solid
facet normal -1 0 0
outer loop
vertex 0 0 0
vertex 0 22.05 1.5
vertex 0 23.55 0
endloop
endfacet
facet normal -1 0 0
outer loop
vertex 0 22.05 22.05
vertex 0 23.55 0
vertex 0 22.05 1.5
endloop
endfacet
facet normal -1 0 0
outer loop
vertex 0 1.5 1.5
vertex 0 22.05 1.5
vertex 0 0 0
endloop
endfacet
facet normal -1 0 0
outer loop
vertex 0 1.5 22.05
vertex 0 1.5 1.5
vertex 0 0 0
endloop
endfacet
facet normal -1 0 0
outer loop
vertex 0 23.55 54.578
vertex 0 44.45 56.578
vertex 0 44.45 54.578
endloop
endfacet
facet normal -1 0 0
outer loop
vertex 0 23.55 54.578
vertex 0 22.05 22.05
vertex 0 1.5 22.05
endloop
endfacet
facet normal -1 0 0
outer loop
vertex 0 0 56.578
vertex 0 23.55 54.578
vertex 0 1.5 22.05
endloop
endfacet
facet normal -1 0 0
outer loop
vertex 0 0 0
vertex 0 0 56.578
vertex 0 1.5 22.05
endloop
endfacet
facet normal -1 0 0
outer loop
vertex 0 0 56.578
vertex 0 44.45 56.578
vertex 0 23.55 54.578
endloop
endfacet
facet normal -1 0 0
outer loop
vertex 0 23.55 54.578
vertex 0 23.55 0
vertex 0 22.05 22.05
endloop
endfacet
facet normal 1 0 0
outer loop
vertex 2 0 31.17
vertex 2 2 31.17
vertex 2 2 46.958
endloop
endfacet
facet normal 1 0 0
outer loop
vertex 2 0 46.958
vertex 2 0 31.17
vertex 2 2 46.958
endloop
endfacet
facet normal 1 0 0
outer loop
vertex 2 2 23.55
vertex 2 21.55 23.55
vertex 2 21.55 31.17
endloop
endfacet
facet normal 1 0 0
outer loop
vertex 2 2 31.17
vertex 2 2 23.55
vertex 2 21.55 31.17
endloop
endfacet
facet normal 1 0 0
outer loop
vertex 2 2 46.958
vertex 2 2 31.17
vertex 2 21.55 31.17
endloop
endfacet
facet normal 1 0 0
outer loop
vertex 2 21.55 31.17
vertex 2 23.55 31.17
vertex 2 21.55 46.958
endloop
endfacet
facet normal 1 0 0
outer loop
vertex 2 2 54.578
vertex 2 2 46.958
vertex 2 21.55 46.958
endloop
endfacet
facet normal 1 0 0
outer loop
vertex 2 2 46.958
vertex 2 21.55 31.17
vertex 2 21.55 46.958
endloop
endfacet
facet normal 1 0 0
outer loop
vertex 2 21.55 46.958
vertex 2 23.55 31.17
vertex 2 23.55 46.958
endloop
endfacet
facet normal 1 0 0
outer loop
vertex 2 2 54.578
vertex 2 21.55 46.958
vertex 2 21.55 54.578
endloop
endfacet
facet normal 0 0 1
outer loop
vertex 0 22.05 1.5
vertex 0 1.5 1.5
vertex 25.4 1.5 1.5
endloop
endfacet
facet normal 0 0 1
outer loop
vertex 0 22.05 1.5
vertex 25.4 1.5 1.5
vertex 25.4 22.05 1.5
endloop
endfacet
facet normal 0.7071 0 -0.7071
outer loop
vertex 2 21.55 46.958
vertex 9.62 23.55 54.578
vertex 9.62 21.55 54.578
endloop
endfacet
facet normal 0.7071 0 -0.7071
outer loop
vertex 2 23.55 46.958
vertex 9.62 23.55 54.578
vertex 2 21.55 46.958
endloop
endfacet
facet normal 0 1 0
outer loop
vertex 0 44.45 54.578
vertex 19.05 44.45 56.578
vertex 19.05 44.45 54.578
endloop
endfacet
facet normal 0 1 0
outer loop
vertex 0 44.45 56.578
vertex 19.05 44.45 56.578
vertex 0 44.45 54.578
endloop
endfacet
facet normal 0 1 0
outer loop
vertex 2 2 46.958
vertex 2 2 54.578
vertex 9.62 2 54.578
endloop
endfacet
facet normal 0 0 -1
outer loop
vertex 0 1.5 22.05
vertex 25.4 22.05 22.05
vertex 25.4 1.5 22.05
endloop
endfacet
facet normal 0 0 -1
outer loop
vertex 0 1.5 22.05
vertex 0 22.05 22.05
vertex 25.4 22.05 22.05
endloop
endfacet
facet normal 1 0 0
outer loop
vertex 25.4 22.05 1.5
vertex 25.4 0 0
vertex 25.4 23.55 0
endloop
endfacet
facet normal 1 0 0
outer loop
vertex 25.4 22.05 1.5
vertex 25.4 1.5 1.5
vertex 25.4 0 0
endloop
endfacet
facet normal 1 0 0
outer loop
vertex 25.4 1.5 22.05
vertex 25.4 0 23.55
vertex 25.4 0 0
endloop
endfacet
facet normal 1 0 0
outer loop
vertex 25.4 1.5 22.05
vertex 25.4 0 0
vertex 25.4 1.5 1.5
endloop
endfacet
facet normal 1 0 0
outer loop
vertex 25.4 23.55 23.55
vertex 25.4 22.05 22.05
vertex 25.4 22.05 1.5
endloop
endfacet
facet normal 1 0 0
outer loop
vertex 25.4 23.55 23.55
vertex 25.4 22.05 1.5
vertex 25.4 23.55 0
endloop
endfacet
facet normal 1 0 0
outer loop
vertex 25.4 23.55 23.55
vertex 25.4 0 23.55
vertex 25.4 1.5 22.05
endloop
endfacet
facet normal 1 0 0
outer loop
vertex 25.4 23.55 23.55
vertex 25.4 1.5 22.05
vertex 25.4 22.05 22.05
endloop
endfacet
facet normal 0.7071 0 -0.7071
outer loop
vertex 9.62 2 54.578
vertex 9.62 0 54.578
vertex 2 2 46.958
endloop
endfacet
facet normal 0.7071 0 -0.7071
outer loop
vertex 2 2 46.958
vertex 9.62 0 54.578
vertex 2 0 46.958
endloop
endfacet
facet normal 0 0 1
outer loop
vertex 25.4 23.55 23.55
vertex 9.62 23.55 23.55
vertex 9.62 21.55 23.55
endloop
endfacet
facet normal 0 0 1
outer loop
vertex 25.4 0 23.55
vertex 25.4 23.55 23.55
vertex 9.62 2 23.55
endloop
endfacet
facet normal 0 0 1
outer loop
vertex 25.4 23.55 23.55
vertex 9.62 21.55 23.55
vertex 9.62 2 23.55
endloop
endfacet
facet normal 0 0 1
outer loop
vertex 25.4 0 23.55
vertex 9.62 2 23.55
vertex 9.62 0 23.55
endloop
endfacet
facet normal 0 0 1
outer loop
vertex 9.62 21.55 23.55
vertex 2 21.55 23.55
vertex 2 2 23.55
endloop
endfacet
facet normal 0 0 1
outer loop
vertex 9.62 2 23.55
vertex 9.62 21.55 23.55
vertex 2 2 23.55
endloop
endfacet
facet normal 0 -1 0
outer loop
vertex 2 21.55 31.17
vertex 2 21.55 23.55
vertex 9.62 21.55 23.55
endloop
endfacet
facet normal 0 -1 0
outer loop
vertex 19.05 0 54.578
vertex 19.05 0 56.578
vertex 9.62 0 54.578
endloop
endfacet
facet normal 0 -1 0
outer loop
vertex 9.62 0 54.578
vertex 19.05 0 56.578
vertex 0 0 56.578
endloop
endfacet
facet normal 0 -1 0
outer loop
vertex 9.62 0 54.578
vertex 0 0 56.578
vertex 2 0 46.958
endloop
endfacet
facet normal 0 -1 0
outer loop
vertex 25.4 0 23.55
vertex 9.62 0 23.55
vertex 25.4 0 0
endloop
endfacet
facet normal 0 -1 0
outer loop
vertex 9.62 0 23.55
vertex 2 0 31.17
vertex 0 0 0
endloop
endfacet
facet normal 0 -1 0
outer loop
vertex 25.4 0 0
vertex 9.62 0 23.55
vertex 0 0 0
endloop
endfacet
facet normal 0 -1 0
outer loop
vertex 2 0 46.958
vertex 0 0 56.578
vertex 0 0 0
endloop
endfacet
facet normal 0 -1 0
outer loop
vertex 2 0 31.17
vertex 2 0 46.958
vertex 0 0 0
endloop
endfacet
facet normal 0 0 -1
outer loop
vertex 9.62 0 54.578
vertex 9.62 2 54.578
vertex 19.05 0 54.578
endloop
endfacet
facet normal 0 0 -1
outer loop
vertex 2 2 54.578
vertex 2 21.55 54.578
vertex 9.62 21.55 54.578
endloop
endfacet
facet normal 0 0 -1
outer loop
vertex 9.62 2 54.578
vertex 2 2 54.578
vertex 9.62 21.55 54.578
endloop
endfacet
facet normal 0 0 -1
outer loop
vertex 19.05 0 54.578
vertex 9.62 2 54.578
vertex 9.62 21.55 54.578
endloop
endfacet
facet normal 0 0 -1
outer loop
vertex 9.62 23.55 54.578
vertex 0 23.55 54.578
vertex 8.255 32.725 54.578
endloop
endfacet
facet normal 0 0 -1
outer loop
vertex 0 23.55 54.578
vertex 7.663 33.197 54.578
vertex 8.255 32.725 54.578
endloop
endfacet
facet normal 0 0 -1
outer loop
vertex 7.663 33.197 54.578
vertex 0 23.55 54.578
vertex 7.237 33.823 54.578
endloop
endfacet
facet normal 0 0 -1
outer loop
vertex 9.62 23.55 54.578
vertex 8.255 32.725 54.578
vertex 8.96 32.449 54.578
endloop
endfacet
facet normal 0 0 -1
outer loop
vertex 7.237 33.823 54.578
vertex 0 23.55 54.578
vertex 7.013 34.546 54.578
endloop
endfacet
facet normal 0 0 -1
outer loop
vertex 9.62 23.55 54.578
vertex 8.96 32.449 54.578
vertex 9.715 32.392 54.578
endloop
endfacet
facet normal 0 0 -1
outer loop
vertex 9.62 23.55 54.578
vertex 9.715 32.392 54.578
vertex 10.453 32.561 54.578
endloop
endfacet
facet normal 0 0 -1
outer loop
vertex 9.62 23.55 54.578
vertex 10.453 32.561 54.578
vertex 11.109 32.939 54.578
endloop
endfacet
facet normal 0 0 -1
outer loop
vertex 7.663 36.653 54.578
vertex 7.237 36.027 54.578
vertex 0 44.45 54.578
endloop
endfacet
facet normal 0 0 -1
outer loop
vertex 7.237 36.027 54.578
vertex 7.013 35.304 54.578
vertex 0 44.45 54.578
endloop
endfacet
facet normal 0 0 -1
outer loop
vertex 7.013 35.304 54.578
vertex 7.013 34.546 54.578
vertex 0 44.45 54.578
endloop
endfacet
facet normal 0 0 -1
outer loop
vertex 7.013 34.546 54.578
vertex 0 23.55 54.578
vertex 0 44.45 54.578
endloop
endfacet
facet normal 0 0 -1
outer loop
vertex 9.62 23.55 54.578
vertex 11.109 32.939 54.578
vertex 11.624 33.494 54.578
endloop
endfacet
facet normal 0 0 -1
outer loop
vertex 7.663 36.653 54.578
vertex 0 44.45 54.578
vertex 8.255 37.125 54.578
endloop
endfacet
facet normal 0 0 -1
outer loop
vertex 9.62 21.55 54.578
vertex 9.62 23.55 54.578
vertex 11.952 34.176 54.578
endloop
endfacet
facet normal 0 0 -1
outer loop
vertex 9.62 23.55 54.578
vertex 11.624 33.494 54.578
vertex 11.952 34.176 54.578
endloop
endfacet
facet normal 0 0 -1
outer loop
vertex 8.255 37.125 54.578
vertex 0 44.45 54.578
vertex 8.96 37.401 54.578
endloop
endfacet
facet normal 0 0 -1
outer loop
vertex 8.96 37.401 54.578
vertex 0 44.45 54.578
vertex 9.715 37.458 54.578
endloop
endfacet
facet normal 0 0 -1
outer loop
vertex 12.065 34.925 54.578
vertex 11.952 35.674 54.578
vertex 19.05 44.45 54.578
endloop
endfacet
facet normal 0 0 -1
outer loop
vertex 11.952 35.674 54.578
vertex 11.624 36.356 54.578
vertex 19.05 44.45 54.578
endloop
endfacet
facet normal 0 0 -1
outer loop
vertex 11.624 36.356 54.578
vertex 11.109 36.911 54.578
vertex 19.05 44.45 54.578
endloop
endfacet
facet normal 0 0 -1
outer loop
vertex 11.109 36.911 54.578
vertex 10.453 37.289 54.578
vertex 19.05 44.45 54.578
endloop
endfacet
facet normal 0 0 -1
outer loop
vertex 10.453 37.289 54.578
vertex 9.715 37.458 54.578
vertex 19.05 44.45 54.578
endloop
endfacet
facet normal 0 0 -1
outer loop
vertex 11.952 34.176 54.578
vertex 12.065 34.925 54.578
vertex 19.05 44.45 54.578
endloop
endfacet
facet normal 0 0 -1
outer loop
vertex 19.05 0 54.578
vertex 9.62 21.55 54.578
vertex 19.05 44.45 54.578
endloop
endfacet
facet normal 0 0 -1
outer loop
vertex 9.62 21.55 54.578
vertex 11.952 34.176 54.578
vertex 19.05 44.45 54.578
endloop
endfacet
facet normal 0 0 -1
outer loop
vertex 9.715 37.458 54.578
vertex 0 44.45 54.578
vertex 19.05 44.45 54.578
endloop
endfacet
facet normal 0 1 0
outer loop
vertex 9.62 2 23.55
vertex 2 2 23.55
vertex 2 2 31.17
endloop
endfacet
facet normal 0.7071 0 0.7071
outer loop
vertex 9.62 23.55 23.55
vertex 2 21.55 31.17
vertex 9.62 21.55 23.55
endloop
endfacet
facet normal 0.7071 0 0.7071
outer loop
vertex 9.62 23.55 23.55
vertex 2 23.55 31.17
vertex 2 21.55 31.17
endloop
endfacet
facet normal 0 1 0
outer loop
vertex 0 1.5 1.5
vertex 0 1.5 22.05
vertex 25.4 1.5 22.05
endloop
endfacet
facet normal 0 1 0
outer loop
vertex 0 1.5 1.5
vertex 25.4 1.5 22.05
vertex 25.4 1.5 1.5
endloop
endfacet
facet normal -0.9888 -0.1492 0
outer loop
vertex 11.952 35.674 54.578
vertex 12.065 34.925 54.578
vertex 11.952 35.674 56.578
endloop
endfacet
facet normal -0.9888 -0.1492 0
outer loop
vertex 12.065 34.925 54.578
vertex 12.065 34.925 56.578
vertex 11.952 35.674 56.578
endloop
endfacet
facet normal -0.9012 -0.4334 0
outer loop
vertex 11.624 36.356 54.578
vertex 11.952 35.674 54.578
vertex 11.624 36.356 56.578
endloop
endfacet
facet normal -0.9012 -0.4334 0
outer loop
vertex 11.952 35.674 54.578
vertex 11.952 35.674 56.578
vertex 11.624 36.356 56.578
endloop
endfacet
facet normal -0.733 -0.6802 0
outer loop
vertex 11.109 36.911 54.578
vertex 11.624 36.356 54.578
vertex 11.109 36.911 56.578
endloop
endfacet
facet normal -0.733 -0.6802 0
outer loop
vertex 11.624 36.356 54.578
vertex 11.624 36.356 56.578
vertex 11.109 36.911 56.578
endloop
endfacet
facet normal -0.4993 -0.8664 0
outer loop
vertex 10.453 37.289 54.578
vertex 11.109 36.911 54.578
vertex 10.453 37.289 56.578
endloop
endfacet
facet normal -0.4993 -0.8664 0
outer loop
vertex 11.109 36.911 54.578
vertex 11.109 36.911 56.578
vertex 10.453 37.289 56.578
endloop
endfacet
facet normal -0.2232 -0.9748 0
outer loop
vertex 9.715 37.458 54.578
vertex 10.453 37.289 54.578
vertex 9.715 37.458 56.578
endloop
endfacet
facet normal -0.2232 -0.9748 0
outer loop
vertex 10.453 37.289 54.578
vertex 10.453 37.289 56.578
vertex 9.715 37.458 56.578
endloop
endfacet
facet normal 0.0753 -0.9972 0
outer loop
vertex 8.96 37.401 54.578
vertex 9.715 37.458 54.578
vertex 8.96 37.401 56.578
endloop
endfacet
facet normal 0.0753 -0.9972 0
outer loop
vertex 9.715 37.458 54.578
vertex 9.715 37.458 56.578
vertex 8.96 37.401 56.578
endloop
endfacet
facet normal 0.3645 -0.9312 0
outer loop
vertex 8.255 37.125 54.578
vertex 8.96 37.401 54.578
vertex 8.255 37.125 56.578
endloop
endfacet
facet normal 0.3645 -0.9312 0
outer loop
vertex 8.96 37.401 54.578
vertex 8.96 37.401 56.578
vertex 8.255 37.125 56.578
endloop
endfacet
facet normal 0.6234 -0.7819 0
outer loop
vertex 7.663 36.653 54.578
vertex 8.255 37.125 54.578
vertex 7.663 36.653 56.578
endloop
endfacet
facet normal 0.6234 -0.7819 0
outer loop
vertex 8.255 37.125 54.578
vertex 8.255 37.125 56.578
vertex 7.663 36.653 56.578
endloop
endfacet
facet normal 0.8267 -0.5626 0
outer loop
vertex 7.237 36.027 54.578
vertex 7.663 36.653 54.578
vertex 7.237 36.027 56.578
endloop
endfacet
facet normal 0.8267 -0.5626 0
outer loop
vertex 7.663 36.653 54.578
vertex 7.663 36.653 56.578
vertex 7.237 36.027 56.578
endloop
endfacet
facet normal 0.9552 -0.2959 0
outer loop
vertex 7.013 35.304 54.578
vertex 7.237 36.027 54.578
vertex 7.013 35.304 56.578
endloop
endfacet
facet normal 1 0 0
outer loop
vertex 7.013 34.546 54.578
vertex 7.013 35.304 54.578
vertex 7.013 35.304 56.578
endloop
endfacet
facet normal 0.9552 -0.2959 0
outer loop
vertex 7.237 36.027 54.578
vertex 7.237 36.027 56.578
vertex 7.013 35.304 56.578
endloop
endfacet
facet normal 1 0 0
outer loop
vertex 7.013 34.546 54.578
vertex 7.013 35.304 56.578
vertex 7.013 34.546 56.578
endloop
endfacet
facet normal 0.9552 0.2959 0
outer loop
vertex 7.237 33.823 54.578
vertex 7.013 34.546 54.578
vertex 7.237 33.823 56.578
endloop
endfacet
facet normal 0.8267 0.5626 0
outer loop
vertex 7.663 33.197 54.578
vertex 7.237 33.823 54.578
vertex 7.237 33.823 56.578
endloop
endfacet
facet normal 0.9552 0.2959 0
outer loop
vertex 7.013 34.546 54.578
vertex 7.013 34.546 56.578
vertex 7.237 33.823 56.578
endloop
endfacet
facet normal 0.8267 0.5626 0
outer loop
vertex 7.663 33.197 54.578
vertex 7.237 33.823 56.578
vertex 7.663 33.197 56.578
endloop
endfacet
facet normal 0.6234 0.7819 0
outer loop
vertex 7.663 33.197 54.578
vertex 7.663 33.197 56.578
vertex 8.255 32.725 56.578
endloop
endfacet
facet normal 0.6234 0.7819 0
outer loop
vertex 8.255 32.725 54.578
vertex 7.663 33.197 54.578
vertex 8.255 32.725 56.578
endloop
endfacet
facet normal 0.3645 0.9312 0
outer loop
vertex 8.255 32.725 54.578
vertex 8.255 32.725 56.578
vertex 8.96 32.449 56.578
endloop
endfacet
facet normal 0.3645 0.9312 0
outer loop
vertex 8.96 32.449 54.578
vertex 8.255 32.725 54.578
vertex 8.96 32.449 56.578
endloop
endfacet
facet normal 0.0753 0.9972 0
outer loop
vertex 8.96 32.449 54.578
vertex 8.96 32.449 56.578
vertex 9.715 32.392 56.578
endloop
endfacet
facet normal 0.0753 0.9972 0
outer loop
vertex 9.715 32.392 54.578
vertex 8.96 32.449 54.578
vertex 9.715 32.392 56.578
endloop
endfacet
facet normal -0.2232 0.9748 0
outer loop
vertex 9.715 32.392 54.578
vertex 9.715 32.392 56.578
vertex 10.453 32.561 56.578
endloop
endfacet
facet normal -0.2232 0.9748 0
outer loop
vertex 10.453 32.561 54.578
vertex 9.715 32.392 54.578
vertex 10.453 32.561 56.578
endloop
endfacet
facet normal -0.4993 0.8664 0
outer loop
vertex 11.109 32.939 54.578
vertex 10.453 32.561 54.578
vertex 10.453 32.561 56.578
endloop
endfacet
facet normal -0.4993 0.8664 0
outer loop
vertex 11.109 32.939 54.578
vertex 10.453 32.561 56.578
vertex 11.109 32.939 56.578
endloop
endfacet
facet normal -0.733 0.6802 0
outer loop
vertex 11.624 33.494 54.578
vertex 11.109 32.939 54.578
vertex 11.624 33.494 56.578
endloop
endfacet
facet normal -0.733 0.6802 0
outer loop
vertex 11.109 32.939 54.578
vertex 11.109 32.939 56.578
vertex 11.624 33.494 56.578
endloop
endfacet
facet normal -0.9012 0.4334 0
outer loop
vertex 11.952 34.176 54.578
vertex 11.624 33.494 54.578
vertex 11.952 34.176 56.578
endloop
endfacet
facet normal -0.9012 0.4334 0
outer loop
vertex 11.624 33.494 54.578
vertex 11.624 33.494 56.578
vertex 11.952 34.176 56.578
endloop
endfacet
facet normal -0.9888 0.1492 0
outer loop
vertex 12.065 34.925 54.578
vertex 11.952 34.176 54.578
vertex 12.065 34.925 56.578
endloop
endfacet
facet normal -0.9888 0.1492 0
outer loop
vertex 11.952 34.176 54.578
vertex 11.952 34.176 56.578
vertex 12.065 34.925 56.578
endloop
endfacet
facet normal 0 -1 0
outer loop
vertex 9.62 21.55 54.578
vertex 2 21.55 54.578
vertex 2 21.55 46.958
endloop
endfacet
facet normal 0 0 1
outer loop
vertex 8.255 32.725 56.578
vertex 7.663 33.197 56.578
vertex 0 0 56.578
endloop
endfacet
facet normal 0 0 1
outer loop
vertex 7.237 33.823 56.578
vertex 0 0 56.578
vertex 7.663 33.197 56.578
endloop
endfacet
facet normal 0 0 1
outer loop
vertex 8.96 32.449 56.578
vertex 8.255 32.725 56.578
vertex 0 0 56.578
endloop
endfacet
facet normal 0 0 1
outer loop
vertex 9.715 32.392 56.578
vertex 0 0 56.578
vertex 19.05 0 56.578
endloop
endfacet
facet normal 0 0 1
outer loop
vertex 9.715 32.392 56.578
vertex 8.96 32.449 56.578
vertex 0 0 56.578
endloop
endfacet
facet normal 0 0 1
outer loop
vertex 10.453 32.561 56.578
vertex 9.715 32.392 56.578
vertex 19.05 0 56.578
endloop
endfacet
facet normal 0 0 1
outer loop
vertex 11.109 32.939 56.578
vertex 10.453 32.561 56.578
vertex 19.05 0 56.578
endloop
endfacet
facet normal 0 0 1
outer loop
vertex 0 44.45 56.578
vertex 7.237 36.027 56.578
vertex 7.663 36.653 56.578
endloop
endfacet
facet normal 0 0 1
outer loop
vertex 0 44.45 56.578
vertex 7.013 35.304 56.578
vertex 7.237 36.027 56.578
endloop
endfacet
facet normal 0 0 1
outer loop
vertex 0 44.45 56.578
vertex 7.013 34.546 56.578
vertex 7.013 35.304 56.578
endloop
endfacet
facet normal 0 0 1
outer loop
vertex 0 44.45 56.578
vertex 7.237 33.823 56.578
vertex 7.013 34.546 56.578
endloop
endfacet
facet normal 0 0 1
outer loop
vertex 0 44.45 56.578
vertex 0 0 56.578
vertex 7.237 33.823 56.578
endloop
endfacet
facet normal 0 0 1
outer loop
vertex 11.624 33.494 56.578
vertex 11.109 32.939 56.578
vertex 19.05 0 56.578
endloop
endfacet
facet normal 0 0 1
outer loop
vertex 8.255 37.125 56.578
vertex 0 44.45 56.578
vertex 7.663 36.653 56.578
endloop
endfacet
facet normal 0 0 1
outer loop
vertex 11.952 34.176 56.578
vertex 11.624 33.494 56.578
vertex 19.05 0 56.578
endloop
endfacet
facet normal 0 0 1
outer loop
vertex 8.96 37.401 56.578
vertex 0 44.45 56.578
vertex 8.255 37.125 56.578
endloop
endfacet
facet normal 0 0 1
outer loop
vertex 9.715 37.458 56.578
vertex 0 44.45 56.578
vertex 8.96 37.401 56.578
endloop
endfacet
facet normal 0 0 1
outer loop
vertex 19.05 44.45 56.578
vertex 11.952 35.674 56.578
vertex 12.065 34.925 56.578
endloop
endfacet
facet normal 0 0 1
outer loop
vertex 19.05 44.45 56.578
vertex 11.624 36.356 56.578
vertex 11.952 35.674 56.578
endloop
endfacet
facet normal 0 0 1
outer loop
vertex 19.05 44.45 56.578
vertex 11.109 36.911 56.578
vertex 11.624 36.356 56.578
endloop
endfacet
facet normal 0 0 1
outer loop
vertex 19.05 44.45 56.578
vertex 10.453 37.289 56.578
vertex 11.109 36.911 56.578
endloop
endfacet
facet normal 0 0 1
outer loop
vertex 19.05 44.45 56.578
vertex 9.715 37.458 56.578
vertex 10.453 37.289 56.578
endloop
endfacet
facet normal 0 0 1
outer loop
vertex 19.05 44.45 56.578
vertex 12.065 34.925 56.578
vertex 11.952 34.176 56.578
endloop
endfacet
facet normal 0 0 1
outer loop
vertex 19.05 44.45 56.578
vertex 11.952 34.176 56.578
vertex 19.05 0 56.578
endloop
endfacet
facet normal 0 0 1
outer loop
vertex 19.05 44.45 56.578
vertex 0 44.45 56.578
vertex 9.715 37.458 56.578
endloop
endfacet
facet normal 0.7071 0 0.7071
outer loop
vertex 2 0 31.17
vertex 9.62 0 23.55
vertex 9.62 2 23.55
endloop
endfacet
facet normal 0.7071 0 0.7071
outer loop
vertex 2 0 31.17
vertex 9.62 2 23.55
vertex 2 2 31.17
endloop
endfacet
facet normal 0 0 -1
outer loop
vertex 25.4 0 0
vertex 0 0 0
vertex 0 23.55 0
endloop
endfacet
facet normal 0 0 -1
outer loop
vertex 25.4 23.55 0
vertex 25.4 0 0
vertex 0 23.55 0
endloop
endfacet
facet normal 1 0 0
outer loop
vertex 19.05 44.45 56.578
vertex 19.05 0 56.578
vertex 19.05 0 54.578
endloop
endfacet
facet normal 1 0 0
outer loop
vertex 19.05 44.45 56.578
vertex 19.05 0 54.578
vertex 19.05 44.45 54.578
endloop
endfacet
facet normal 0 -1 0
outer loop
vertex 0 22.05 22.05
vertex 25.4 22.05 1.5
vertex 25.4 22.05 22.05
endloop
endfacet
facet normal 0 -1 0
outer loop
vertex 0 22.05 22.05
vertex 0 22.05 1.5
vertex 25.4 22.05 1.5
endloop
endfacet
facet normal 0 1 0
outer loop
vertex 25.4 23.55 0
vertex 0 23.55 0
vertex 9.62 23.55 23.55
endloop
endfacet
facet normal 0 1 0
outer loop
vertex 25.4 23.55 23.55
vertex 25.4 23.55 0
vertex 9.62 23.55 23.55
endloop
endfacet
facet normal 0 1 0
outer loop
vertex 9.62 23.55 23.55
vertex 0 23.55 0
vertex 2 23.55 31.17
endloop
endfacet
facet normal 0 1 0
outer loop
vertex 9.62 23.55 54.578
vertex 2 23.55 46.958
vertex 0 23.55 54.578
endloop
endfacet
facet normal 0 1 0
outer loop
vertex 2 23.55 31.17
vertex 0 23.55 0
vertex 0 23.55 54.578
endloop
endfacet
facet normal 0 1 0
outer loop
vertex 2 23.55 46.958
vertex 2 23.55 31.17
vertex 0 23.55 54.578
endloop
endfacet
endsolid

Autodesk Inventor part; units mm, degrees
ref_plane "YZ Plane" through (0, 0, 0) normal (1, 0, 0) x (0, 1, 0)
ref_plane "XZ Plane" through (0, 0, 0) normal (0, 1, 0) x (-1, 0, 0)
ref_plane "XY Plane" through (0, 0, 0) normal (0, 0, 1) x (1, 0, 0)
sketch "Sketch2" plane through (0, 0, 0) normal (1, 0, 0) x (0, 1, 0)
  line L0 (0, 0) -> (23.55, 0)
  line L1 (23.55, 0) -> (23.55, 23.55)
  line L2 (23.55, 23.55) -> (0, 23.55)
  line L3 (0, 23.55) -> (0, 0)
  line L4 (1.5, 1.5) -> (22.05, 1.5)
  line L5 (22.05, 1.5) -> (22.05, 22.05)
  line L6 (22.05, 22.05) -> (1.5, 22.05)
  line L7 (1.5, 22.05) -> (1.5, 1.5)
  dimension "d0" = 1.5
  dimension "d1" = 1.5
  dimension "d2" = 1.5
  dimension "d3" = 1.5
  dimension "d4" = 20.55
  dimension "d5" = 20.55
  dimension "widthSqAlum" = 23.55
extrude "Extrusion1" add sketch "Sketch2" along normal blind 25.4
sketch "Sketch3" plane through (0, 0, 0) normal (-1, 0, 0) x (0, 0, 1)
  line L0 (23.55, 0) -> (56.5781, 0)
  line L1 (56.5781, 0) -> (56.5781, 23.55)
  line L2 (56.5781, 23.55) -> (23.55, 23.55)
  line L3 (23.55, 23.55) -> (23.55, 0)
  dimension "d8" = 33.0281
  dimension "d9" = 23.55
extrude "Extrusion2" add sketch "Sketch3" against normal blind 2
sketch "Sketch6" plane through (0, 0, 56.5781) normal (0, 0, 1) x (1, 0, 0)
  line L0 (0, 0) -> (0, 23.55) projected
  line L1 (0, 0) -> (2, 0) projected
  line L2 (2, 23.55) -> (2, 0) projected
  line L3 (0, 23.55) -> (2, 23.55) projected
  line L4 (0, 0) -> (19.05, 0)
  line L5 (19.05, 0) -> (19.05, 44.45)
  line L6 (19.05, 44.45) -> (0, 44.45)
  line L7 (0, 44.45) -> (0, 0)
  dimension "d21" = 44.45
  dimension "d22" = 19.05
extrude "Extrusion5" add sketch "Sketch6" against normal blind 2 contours L7 L6 L5 L4 L2 L3
sketch "Sketch7" plane through (0, 44.45, 56.5781) normal (0, 0, 1) x (1, 0, 0)
  line L0 (19.05, -44.45) -> (19.05, 0) projected
  line L1 (19.05, 0) -> (0, 0) projected
  circle A0 centre (9.525, -9.525) radius 2.54
  dimension "d25" = 5.08
  dimension "d26" = 9.525
  dimension "d27" = 9.525
extrude "Extrusion6" cut sketch "Sketch7" against normal up to next
sketch "Sketch10" plane through (0, 23.55, 0) normal (0, 1, 0) x (1, 0, 0)
  line L0 (2, -23.55) -> (2, -54.5781) projected
  line L1 (2, -23.55) -> (25.4, -23.55) projected
  line L2 (0, 0) -> (0, -54.5781) projected
  line L3 (2, -54.5781) -> (9.62, -54.5781)
  line L4 (9.62, -54.5781) -> (2, -46.9581)
  line L5 (2, -23.55) -> (9.62, -23.55)
  line L6 (2, -31.17) -> (9.62, -23.55)
  dimension "d30" = 7.62
  dimension "d31" = 45
  dimension "d32" = 7.62
  dimension "d33" = 45
extrude "Extrusion8" add sketch "Sketch10" against normal blind 2
sketch "Sketch11" plane through (0, 0, 0) normal (0, -1, 0) x (1, 0, 0)
  line L0 (2, 23.55) -> (25.4, 23.55) projected
  line L1 (2, 54.5781) -> (2, 23.55) projected
  line L2 (19.05, 54.5781) -> (2, 54.5781) projected
  line L3 (2, 54.5781) -> (9.62, 54.5781)
  line L4 (9.62, 54.5781) -> (2, 46.9581)
  line L5 (2, 23.55) -> (9.62, 23.55)
  line L6 (9.62, 23.55) -> (2, 31.17)
  dimension "d44" = 45
  dimension "d45" = 45
  dimension "d46" = 7.62
  dimension "d47" = 7.62
extrude "Extrusion9" add sketch "Sketch11" against normal blind 2
equation "\"d0\" = wallThicknessSqAlum"
equation "\"d1\" = wallThicknessSqAlum"
equation "\"d2\" = wallThicknessSqAlum"
equation "\"d3\" = wallThicknessSqAlum"
equation "\"d4\" = sqAlumWidth + sqAlumTolerance"
equation "\"d5\" = sqAlumWidth + sqAlumTolerance"
equation "\"d8\" = -cameraLensHeight + screwDistanceFromFront - wallThicknessSqAlum - 0.5 * sqAlumWidth"
equation "\"d9\" = widthSqAlum"
equation "\"d21\" = heightSqAlum + d22"
equation "\"d23\" = armWallThickness"
equation "\"d26\" = 0.5 * d22"
equation "\"d27\" = 0.5 * d22"
equation "\"d28\" = armWallThickness"
equation "\"d32\" = d30"
equation "\"d33\" = d31"
equation "\"d42\" = armWallThickness"
equation "\"d44\" = d31"
equation "\"d45\" = d31"
equation "\"d46\" = d30"
equation "\"d47\" = d30"
equation "\"d48\" = armWallThickness"
equation "\"sqAlumTolerance\" = 1.5"
equation "\"wallThicknessSqAlum\" = 1.5"
equation "\"sqAlumWidth\" = 19.05"
equation "\"cameraLensHeight\" = 31.75"
equation "\"screwDistanceFromFront\" = 75.803125"
equation "\"heightSqAlum\" = 25.4"
equation "\"armWallThickness\" = 2"
properties part number "cameraMount"
